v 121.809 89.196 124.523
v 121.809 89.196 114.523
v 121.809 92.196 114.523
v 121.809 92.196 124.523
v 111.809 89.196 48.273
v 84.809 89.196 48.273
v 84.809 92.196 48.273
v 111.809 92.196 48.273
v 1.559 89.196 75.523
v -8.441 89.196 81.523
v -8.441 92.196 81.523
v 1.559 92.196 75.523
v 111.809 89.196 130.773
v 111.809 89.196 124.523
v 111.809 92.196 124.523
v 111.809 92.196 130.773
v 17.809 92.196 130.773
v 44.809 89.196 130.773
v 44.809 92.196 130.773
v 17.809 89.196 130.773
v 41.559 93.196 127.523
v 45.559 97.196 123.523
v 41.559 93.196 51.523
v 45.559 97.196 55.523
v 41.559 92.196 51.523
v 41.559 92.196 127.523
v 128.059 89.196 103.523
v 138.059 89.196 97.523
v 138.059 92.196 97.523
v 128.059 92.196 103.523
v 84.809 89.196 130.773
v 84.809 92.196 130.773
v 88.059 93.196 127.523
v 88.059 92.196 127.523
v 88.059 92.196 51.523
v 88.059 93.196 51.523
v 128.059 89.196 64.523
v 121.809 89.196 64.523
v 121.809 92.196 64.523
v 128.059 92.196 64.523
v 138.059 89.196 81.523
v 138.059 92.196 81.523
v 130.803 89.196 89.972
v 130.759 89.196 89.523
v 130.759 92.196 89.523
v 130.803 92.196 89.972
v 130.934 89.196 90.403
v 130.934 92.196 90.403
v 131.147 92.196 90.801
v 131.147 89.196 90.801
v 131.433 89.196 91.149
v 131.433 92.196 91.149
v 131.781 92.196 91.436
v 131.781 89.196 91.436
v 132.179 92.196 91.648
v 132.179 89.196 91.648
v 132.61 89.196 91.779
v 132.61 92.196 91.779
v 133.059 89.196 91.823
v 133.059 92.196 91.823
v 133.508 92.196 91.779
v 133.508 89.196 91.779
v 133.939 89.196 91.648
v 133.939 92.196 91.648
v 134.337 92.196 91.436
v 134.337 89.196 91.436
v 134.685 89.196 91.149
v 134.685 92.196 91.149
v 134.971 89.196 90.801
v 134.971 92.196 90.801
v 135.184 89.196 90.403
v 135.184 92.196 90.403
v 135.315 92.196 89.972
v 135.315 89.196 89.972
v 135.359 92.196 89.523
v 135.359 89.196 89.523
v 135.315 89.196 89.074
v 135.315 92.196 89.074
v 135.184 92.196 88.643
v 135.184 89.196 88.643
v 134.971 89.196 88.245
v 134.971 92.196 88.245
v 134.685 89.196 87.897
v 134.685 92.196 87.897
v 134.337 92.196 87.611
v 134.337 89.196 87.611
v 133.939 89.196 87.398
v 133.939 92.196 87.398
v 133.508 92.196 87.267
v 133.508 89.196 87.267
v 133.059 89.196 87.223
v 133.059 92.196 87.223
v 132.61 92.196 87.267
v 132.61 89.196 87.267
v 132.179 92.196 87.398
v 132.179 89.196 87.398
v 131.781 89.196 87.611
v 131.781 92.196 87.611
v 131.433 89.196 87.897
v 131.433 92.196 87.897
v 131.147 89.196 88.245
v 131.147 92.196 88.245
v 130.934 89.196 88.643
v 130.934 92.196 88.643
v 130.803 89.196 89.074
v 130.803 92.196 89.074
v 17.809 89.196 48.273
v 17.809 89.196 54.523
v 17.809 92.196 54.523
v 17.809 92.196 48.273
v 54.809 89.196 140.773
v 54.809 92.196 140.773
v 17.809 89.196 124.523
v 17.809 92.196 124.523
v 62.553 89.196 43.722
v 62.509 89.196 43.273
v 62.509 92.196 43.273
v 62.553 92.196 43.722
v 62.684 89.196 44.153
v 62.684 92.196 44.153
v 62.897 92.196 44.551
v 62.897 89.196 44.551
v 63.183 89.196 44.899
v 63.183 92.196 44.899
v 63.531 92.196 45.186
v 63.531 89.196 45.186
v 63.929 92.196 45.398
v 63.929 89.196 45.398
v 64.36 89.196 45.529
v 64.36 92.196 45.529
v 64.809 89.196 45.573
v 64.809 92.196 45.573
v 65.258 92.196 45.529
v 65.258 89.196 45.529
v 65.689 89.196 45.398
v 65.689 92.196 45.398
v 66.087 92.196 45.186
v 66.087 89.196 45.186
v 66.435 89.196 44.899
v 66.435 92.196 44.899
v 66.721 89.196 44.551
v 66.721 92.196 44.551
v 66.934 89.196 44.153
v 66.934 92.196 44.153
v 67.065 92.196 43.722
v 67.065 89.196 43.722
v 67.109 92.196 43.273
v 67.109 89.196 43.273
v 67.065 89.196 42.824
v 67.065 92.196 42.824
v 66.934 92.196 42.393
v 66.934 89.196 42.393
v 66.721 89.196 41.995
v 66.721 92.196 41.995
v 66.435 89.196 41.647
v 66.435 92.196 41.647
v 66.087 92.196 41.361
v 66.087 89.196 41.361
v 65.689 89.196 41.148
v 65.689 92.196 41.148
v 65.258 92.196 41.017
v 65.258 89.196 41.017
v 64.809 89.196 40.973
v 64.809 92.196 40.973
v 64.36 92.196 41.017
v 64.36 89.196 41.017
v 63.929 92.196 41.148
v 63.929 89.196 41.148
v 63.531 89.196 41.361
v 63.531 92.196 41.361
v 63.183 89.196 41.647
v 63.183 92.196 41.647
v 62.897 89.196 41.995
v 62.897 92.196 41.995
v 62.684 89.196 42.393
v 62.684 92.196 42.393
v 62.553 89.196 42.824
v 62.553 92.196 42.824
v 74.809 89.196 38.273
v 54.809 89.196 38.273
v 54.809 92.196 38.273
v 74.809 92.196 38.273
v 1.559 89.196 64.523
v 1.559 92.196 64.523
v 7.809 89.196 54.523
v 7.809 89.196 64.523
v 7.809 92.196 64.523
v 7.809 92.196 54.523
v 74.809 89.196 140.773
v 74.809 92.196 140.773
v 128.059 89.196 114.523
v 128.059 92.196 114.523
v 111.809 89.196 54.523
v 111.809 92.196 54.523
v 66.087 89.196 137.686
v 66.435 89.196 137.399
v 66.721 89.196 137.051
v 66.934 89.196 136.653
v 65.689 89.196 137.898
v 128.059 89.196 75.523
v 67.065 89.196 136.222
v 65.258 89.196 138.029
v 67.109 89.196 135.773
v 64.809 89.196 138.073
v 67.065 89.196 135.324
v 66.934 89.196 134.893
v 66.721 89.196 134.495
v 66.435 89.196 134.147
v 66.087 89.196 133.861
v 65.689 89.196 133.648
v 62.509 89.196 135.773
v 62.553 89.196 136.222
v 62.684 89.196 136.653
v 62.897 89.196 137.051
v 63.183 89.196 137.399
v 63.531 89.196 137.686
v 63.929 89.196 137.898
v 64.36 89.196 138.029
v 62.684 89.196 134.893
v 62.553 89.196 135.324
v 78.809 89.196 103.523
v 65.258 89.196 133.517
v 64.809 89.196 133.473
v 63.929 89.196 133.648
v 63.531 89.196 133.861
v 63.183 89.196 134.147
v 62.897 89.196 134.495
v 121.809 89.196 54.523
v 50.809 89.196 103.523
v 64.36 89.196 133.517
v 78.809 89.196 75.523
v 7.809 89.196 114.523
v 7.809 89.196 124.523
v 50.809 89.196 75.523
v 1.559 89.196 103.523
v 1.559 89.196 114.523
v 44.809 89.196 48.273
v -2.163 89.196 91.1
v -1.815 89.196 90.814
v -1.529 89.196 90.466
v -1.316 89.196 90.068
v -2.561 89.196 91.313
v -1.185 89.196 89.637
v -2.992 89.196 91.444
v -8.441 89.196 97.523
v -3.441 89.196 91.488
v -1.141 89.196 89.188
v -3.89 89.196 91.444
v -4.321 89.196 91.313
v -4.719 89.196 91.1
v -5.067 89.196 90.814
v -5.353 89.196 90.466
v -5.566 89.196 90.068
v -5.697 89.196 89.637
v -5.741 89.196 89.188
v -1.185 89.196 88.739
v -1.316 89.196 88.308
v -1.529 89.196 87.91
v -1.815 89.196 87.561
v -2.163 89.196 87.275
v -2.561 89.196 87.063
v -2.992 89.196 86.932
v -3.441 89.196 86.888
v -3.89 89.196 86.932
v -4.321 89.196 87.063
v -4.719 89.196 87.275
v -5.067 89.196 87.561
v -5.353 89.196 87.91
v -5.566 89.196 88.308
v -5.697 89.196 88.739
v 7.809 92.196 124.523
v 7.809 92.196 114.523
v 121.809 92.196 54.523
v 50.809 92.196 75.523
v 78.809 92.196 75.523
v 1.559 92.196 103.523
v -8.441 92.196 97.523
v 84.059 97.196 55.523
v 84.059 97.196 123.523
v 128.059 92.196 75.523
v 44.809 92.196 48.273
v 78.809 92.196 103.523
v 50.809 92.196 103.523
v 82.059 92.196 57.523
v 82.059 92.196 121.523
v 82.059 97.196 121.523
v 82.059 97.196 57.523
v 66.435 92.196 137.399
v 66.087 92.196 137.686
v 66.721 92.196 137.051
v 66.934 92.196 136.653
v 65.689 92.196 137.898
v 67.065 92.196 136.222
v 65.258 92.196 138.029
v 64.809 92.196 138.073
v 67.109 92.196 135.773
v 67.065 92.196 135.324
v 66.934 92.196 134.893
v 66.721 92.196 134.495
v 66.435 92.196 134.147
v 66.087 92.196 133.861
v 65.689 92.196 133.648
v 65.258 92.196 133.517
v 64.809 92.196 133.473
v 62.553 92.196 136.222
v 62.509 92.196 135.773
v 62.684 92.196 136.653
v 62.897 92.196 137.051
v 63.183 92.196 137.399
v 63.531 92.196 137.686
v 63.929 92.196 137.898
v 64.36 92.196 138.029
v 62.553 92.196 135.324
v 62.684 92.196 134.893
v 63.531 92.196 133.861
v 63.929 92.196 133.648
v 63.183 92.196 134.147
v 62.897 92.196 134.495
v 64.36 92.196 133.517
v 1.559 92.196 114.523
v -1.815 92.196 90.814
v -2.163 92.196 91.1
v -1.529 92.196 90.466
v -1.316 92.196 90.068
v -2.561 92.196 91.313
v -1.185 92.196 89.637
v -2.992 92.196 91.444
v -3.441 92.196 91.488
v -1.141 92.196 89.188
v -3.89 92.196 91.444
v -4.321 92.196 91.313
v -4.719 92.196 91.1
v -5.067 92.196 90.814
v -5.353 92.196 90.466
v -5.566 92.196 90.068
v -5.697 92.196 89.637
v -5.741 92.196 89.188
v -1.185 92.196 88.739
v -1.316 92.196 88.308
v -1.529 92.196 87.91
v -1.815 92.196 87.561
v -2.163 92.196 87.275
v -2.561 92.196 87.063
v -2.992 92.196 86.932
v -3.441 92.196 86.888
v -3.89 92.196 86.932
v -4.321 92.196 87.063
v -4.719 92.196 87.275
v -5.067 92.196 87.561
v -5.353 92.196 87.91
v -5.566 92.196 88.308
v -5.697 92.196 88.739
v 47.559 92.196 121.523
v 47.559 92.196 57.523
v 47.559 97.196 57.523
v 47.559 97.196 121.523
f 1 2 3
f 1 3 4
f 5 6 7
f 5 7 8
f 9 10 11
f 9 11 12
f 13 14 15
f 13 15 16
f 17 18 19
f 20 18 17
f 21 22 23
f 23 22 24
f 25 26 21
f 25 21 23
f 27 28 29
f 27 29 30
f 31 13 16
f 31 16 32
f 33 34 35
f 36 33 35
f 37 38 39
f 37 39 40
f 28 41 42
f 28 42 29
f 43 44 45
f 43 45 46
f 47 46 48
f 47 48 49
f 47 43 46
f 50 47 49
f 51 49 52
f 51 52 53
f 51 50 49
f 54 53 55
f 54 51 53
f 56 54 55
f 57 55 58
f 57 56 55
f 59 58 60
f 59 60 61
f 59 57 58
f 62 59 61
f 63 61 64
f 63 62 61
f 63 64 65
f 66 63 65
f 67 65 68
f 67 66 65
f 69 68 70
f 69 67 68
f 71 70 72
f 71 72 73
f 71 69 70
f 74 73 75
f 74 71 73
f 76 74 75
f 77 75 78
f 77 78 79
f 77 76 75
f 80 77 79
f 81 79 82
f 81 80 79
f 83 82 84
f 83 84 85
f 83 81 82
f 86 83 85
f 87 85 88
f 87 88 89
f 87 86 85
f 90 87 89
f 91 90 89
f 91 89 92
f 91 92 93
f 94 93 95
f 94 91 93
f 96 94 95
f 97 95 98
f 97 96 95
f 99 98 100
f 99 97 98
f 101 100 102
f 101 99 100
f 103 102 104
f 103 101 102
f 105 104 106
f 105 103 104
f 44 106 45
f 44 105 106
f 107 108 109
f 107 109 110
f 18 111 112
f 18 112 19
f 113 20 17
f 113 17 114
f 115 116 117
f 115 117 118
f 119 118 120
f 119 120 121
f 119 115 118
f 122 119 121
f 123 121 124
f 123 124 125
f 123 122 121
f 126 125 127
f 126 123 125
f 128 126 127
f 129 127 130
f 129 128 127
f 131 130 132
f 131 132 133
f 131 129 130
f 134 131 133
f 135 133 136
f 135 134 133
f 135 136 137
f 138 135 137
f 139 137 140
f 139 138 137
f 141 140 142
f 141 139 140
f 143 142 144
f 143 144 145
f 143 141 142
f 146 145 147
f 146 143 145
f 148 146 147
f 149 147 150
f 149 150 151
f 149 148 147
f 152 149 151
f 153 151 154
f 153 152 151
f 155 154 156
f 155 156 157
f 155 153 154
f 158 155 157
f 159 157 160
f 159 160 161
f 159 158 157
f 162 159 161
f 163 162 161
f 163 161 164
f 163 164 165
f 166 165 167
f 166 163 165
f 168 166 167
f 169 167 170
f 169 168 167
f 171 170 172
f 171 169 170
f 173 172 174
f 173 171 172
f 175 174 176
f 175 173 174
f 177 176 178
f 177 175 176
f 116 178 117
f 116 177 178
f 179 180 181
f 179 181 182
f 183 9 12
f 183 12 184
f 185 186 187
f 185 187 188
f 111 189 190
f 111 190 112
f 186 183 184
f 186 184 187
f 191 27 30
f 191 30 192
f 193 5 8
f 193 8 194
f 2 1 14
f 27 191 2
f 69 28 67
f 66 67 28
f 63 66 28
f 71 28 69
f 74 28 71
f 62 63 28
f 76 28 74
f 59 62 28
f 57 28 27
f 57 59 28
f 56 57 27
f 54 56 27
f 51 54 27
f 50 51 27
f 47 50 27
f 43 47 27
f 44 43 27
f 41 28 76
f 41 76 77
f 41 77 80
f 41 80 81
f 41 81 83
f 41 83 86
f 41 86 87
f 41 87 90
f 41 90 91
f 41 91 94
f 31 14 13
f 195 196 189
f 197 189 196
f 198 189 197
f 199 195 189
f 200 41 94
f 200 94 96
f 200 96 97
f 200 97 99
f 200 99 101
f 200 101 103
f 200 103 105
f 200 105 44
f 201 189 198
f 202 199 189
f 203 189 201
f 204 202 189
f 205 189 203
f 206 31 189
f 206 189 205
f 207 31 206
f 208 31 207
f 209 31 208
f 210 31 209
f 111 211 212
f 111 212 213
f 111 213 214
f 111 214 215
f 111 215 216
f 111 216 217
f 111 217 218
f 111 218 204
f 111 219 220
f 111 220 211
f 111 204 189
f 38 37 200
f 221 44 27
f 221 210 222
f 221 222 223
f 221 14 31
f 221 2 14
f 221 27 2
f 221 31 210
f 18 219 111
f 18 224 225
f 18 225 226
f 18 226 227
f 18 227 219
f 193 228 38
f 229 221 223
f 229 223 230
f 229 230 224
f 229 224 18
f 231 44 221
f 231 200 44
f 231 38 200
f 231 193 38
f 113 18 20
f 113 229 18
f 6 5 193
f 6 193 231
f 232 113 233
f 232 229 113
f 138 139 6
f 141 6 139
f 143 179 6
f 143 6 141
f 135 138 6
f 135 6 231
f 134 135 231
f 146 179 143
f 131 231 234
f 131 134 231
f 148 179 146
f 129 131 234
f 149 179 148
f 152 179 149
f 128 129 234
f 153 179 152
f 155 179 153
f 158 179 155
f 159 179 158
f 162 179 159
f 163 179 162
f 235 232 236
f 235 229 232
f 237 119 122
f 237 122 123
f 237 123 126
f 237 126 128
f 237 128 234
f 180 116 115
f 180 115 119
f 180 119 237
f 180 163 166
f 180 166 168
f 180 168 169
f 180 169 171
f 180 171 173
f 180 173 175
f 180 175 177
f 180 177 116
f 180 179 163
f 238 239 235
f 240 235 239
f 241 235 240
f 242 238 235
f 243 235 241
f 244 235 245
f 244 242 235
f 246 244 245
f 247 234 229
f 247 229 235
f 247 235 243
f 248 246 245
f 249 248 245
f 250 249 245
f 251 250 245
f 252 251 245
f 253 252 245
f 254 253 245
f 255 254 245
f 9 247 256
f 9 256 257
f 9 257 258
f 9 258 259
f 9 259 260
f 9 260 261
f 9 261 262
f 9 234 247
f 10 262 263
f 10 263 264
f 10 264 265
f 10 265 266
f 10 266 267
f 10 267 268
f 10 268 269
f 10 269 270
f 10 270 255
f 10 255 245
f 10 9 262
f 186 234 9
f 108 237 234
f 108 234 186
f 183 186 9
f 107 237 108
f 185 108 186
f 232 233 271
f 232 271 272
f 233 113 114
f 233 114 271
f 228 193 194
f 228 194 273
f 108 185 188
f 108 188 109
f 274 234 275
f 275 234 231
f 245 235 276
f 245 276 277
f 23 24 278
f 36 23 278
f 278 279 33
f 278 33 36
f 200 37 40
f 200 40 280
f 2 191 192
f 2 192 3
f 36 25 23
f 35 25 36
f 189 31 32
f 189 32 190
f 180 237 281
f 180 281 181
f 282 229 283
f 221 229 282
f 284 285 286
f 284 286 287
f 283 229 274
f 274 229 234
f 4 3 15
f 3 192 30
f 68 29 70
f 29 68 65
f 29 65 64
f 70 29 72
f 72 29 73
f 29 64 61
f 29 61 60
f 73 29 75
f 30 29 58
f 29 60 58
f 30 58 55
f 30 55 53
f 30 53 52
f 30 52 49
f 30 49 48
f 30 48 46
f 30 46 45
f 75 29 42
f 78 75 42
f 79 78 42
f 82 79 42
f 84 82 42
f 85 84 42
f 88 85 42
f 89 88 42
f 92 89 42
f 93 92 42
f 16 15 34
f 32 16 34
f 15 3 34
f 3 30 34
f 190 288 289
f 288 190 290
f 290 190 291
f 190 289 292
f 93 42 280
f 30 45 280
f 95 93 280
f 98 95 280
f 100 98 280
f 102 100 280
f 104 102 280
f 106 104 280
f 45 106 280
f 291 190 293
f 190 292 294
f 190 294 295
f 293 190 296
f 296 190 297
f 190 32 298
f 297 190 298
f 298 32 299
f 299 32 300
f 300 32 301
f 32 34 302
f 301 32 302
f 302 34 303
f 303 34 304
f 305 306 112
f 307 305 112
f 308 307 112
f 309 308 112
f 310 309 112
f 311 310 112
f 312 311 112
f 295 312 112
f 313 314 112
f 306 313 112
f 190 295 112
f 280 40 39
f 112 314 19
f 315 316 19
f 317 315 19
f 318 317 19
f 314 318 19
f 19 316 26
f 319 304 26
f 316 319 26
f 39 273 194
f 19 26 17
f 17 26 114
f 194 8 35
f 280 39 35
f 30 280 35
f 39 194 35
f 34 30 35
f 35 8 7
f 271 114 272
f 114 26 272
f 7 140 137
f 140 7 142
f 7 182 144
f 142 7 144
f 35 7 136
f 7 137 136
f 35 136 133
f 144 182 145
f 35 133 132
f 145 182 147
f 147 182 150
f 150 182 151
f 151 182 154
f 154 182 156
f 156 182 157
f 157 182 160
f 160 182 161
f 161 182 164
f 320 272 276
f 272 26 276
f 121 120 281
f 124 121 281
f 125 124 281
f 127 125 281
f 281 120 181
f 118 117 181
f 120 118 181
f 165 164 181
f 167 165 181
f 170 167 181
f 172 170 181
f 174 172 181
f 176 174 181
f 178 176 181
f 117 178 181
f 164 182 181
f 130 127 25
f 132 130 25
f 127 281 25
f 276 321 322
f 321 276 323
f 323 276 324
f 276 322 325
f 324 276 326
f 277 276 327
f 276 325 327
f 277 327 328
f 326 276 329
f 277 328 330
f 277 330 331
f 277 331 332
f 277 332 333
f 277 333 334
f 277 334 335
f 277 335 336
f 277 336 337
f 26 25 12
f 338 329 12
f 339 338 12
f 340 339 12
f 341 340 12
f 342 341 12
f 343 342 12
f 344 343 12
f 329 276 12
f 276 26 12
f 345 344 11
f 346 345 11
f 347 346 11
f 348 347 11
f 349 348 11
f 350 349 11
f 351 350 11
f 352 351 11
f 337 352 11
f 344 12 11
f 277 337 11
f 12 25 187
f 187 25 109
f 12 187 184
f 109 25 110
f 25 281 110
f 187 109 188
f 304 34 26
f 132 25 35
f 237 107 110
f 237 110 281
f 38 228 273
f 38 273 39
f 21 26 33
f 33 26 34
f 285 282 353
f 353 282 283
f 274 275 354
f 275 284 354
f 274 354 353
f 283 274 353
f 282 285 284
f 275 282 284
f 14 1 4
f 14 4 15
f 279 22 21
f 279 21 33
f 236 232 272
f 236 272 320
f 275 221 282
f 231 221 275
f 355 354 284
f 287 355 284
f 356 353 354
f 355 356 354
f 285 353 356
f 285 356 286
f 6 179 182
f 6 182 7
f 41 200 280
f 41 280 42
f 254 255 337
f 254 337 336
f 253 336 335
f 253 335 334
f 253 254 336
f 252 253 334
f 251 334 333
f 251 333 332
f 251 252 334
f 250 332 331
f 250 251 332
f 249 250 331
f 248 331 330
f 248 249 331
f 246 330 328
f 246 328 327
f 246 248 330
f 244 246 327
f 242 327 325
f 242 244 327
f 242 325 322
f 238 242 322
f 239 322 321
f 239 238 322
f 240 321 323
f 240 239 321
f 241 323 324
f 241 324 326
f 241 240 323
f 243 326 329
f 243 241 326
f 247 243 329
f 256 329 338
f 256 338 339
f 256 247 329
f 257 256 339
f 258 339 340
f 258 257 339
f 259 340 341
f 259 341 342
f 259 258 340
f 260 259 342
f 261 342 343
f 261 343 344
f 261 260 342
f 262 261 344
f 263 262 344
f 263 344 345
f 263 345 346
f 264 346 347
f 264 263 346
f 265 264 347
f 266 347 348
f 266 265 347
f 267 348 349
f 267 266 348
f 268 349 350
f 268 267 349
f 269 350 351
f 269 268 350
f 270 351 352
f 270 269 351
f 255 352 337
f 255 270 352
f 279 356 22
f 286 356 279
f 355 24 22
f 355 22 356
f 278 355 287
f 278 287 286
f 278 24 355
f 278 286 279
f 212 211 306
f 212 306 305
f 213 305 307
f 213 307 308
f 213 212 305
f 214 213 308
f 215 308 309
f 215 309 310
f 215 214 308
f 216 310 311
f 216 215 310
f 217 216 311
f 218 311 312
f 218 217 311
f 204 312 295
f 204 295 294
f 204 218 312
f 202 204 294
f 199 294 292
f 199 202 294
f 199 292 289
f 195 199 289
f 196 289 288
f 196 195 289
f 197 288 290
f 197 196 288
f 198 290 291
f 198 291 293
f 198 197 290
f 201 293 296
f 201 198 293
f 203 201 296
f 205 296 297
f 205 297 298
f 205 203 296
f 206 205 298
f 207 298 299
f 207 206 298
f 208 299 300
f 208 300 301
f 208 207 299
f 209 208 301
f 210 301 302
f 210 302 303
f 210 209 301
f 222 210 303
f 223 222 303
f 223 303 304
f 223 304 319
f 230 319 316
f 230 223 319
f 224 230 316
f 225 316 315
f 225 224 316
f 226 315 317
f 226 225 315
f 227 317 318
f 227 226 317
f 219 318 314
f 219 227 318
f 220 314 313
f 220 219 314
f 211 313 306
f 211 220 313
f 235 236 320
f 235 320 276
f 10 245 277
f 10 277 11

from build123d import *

# Parameters (mm, degrees)
SKETCH_1_R      = 2.3
SKETCH_1_W      = 28
SKETCH_1_H      = 28
EXTRUDE_1_DEPTH = 3
SKETCH_2_W      = 46.5
SKETCH_2_H      = 76
SKETCH_2_W_2    = 34.5
SKETCH_2_H_2    = 64
EXTRUDE_2_DEPTH = 5
CHAMFER_1_SIZE  = 4


with BuildPart() as part:
    # Эскиз1 → Бобышка-Вытянуть1 (new body)
    with BuildSketch(Plane(origin=(0, 89.195974268, 0), x_dir=(1, 0, 0), z_dir=(0, 1, 0))):
        Polygon((44.808980694, -48.273129836), (54.808980694, -38.273129836), (74.808980694, -38.273129836), (84.808980694, -48.273129836), (111.808980694, -48.273129836), (111.808980694, -54.523129836), (121.808980694, -54.523129836), (121.808980694, -64.523129836), (128.058980694, -64.523129836), (128.058980694, -75.523129836), (138.058980694, -81.523129836), (138.058980694, -97.523129836), (128.058980694, -103.523129836), (128.058980694, -114.523129836), (121.808980694, -114.523129836), (121.808980694, -124.523129836), (111.808980694, -124.523129836), (111.808980694, -130.773129836), (84.808980694, -130.773129836), (74.808980694, -140.773129836), (54.808980694, -140.773129836), (44.808980694, -130.773129836), (17.808980694, -130.773129836), (17.808980694, -124.523129836), (7.808980694, -124.523129836), (7.808980694, -114.523129836), (1.558980694, -114.523129836), (1.558980694, -103.523129836), (-8.441019306, -97.523129836), (-8.441019306, -81.523129836), (1.558980694, -75.523129836), (1.558980694, -64.523129836), (7.808980694, -64.523129836), (7.808980694, -54.523129836), (17.808980694, -54.523129836), (17.808980694, -48.273129836), align=None)
        with Locations(Location((-3.441019306, -89.187817333, 0), (0, 0, 180))):
            Circle(SKETCH_1_R, mode=Mode.SUBTRACT)
        with Locations(Location((64.808980694, -43.273129836, 0), (0, 0, 180))):
            Circle(SKETCH_1_R, mode=Mode.SUBTRACT)
        with Locations(Location((133.058980694, -89.523129836, 0), (0, 0, 180))):
            Circle(SKETCH_1_R, mode=Mode.SUBTRACT)
        with Locations(Location((64.808980694, -135.773129836, 0), (0, 0, 180))):
            Circle(SKETCH_1_R, mode=Mode.SUBTRACT)
        with Locations((64.808980694, -89.523129836)):
            Rectangle(SKETCH_1_W, SKETCH_1_H, mode=Mode.SUBTRACT)
    extrude(amount=EXTRUDE_1_DEPTH)

    # Эскиз2 → Бобышка-Вытянуть2 (add)
    with BuildSketch(Plane(origin=(0, 92.195974268, 0), x_dir=(1, 0, 0), z_dir=(0, 1, 0))):
        with Locations((64.808980694, -89.523129836)):
            Rectangle(SKETCH_2_W, SKETCH_2_H)
        with Locations((64.808980694, -89.523129836)):
            Rectangle(SKETCH_2_W_2, SKETCH_2_H_2, mode=Mode.SUBTRACT)
    extrude(amount=EXTRUDE_2_DEPTH)

    # Фаска1
    chamfer_1_edges = [part.edges().sort_by_distance(p)[0] for p in [
        (41.558980694, 97.195974268, 89.523129836),
        (64.808980694, 97.195974268, 127.523129836),
        (88.058980694, 97.195974268, 89.523129836),
        (64.808980694, 97.195974268, 51.523129836),
    ]]
    chamfer(chamfer_1_edges, length=CHAMFER_1_SIZE)


solid = part.part
